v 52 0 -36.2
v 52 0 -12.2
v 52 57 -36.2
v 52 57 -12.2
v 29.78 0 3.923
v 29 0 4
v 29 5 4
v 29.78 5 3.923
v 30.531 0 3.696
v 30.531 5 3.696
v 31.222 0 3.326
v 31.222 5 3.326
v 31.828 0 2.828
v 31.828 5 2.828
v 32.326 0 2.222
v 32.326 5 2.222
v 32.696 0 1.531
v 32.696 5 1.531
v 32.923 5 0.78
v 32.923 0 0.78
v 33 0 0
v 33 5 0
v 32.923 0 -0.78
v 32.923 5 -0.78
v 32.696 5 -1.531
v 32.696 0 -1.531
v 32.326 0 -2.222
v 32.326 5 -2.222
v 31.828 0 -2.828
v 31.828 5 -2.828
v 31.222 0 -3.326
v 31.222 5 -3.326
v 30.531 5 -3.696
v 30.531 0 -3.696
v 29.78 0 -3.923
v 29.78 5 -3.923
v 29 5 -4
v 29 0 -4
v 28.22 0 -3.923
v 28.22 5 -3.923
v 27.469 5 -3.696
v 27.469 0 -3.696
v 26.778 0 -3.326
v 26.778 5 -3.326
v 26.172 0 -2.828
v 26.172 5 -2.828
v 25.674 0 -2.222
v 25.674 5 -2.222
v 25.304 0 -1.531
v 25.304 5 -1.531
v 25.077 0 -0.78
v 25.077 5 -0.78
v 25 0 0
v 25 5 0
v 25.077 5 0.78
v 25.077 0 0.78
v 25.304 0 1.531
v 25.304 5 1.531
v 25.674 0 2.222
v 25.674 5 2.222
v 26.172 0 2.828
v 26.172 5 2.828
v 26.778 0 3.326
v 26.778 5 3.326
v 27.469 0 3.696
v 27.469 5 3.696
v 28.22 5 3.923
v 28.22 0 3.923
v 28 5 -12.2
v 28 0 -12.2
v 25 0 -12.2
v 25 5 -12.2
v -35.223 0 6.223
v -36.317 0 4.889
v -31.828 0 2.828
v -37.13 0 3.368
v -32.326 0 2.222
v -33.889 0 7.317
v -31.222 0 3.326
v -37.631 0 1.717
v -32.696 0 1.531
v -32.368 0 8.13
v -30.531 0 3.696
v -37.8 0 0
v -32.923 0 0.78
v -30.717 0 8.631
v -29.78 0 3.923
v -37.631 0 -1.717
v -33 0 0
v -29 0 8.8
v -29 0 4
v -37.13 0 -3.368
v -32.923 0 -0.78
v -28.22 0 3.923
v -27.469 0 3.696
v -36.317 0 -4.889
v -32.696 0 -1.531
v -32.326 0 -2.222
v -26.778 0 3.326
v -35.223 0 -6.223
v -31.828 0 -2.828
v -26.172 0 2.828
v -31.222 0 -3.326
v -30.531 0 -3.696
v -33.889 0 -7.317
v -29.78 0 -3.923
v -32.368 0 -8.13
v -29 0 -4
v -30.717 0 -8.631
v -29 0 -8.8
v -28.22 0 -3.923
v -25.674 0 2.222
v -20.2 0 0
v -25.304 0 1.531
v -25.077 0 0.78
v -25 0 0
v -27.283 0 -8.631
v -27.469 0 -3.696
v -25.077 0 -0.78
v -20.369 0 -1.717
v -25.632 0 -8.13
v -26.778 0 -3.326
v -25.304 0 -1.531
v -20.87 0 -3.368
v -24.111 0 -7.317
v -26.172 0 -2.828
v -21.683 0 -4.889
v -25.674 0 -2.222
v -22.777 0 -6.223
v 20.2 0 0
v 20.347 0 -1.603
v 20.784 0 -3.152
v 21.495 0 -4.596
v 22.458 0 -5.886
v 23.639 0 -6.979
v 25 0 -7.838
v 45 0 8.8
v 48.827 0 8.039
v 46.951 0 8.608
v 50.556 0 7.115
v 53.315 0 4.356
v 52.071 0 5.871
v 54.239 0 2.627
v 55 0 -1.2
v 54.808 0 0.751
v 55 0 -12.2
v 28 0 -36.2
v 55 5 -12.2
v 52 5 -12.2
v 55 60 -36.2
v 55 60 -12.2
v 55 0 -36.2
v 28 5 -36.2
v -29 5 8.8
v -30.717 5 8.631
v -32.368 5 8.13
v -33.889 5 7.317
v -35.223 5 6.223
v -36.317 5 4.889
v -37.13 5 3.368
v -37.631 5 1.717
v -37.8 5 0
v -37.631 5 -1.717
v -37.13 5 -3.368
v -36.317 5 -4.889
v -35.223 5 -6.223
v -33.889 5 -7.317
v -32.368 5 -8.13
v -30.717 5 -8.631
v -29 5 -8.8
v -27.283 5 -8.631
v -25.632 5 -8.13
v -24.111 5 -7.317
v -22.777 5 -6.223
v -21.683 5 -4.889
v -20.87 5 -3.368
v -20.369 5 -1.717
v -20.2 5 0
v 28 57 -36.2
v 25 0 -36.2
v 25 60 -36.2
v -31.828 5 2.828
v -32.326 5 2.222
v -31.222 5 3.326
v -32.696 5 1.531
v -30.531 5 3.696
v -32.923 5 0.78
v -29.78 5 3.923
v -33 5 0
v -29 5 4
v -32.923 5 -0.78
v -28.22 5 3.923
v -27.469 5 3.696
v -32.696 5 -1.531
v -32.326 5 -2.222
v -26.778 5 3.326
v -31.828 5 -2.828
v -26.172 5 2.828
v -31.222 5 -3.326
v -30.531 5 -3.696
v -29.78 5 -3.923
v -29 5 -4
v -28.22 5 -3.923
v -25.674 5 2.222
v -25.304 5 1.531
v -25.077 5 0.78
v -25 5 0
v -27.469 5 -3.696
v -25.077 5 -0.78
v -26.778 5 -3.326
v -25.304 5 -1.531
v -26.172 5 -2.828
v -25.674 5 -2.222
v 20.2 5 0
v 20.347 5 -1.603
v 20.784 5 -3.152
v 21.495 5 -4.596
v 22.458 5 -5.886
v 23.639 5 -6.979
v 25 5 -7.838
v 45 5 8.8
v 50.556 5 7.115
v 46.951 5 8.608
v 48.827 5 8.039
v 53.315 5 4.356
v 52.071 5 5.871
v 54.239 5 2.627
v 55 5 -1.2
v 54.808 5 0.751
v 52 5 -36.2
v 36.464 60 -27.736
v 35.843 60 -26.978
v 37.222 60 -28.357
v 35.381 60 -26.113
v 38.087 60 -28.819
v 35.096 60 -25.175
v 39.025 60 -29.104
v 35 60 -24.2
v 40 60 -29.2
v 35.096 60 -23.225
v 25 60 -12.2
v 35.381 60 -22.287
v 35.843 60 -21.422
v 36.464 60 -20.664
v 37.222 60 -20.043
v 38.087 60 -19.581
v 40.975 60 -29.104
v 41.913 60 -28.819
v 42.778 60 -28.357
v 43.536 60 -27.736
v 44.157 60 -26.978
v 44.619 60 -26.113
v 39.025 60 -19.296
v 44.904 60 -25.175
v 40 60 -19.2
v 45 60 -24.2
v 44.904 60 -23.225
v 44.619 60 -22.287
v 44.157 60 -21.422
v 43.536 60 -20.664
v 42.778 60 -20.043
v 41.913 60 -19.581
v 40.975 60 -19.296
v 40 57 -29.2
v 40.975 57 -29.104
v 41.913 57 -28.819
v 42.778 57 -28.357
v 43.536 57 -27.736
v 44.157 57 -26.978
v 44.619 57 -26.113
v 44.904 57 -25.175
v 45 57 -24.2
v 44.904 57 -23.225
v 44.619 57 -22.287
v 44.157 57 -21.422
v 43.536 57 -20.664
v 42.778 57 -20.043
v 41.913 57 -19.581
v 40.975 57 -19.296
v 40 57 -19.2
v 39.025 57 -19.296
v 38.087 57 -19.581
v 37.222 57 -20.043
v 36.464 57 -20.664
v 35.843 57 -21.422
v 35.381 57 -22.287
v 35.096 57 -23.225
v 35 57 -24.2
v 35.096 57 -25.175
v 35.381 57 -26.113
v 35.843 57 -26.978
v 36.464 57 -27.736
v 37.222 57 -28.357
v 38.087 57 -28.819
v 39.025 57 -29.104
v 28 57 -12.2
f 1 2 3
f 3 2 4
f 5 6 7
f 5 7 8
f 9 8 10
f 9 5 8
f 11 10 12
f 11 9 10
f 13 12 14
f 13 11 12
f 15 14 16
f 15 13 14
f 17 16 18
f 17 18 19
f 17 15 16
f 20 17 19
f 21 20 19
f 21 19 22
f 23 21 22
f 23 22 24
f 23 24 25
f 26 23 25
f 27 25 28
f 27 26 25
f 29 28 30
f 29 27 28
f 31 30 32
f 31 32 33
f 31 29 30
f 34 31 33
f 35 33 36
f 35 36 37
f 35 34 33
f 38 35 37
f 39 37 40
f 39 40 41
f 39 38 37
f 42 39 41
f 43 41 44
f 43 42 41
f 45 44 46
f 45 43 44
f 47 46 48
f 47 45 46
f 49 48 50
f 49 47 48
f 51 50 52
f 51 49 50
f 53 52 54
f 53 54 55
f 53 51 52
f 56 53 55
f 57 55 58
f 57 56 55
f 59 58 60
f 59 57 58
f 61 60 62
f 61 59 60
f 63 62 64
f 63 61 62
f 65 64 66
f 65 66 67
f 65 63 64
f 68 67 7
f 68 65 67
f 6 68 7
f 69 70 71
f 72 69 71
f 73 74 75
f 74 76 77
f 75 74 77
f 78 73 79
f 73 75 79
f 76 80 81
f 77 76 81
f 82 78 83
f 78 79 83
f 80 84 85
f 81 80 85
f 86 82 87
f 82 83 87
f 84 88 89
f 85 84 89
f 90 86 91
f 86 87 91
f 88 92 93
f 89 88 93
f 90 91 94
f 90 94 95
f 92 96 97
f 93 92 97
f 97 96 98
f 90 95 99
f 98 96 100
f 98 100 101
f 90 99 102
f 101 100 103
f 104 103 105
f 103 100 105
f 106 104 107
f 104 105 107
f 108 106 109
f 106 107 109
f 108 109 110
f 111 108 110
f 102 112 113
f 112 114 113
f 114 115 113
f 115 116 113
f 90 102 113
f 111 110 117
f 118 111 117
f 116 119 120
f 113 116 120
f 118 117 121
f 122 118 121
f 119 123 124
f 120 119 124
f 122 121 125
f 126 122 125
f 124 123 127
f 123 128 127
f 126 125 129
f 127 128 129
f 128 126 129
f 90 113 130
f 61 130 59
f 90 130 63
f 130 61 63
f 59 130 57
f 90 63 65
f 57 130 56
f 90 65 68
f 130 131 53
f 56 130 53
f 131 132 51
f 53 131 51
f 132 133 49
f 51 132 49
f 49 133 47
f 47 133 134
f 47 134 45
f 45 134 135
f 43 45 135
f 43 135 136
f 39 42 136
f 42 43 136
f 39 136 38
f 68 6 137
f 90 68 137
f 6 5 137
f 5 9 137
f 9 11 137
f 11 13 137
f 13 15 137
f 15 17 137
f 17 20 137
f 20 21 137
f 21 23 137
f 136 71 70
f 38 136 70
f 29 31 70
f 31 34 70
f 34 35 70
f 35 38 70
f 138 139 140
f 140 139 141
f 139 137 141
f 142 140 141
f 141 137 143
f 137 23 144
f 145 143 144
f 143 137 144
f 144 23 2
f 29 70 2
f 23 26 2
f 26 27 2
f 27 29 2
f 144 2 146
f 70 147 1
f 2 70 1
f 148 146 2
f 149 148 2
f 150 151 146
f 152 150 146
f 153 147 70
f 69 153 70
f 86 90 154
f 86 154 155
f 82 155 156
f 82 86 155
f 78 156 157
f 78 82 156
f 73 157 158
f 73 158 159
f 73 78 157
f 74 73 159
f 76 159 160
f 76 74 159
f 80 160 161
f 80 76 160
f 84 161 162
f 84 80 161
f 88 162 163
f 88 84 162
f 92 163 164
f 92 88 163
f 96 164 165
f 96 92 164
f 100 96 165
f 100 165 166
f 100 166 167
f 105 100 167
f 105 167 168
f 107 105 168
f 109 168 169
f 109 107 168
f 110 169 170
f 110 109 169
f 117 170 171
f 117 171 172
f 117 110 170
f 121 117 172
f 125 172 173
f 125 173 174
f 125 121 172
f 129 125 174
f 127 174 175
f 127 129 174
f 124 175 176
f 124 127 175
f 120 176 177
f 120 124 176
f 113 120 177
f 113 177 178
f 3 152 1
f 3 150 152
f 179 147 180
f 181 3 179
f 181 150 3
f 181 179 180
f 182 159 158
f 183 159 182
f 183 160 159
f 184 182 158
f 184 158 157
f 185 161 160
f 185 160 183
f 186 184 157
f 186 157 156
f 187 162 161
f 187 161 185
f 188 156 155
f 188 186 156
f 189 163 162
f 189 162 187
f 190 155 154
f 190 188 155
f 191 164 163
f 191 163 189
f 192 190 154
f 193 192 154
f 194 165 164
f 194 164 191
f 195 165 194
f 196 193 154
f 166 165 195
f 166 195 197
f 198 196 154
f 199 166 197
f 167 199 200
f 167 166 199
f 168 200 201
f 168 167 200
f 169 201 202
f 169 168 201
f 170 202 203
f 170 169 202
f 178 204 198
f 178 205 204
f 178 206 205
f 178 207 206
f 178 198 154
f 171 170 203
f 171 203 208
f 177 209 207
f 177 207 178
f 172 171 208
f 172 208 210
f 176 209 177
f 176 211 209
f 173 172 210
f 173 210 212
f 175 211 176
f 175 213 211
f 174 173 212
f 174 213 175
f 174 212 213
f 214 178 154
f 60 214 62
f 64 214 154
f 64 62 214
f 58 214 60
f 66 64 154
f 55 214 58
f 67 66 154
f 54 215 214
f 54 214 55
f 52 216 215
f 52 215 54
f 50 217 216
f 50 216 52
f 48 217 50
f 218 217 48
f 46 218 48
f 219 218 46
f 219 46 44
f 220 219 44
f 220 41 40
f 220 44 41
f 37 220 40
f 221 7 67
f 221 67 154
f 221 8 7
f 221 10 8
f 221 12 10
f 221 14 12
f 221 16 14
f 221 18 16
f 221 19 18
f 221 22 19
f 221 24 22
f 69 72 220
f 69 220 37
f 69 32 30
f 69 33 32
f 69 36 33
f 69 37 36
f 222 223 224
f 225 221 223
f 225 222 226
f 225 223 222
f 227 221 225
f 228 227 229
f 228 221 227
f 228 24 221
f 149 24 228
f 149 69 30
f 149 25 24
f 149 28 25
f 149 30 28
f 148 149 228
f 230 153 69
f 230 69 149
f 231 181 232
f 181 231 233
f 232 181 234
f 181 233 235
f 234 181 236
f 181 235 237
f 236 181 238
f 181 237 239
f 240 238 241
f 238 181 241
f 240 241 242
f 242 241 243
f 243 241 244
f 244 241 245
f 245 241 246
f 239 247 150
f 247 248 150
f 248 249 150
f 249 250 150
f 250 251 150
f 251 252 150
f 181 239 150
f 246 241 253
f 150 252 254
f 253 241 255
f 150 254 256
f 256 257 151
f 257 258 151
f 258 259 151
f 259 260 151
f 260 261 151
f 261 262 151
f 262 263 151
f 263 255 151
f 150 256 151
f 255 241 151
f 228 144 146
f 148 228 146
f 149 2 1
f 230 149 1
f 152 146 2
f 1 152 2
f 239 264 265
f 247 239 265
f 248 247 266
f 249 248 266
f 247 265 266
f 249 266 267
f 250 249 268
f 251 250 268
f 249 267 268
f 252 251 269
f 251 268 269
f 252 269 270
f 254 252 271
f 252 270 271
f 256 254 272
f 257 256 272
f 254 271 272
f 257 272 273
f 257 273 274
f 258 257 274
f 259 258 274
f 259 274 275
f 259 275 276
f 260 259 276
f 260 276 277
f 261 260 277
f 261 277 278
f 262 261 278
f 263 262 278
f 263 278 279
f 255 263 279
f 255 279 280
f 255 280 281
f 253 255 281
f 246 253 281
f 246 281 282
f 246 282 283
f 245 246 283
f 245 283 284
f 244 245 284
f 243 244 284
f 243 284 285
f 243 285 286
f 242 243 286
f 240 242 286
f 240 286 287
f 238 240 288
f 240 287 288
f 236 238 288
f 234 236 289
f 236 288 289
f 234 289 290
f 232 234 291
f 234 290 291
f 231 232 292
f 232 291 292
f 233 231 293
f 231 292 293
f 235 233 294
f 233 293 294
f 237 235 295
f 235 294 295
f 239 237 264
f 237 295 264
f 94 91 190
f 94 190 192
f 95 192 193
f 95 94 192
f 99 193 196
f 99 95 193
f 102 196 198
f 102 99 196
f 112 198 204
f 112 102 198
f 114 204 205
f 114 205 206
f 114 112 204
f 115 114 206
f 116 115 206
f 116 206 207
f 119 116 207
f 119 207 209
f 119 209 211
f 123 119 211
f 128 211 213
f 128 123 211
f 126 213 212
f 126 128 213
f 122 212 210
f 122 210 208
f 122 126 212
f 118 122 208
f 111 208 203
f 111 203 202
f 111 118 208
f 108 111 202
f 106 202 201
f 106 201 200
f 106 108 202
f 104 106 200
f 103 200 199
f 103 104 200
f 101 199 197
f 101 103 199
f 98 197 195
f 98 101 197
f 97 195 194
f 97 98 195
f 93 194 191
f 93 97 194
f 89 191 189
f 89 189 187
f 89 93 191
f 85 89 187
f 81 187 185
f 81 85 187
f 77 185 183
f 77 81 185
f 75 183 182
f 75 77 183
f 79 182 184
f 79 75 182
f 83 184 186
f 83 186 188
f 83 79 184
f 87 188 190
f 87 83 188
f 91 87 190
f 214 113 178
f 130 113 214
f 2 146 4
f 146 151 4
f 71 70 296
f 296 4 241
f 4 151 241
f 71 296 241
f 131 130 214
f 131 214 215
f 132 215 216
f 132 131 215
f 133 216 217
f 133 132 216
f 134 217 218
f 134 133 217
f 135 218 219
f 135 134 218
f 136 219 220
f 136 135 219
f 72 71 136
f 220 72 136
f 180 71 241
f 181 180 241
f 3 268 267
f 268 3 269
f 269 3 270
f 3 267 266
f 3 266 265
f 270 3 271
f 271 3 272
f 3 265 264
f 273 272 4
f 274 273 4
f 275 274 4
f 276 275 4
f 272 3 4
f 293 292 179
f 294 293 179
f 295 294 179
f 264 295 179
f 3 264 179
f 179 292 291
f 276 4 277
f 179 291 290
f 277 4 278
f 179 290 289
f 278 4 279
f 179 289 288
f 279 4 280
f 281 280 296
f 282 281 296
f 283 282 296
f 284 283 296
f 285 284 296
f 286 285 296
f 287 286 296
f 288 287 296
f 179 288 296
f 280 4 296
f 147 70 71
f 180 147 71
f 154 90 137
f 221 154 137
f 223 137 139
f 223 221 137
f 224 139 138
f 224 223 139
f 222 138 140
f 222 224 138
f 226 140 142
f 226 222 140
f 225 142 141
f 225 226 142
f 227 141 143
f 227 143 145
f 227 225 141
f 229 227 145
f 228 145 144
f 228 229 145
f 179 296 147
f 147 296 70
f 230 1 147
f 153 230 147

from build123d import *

# Parameters (mm, degrees)
SKETCH_1_R          = 4
EXTRUDE_1_DEPTH     = 5
EXTRUDE_2_DEPTH     = 5
EXTRUDE_3_DEPTH     = 24
SKETCH_6_R          = 5
CUT_EXTRUDE_1_DEPTH = 5
FILLET_1_R          = 10


with BuildPart() as part:
    # ｽｹｯﾁ1 → ﾎﾞｽ - 押し出し1 (new body)
    with BuildSketch(Plane(origin=(0, 0, 0), x_dir=(1, 0, 0), z_dir=(0, 1, 0))):
        with BuildLine():
            Line((-20.2, 0), (20.2, 0))
            ThreePointArc((20.2, 0), (35.222539674, 6.222539674), (29, -8.8))
            Line((29, -8.8), (-29, -8.8))
            ThreePointArc((-29, -8.8), (-35.222539674, 6.222539674), (-20.2, 0))
        make_face()
        with Locations(Location((-29, 0, 0), (0, 0, 270))):
            Circle(SKETCH_1_R, mode=Mode.SUBTRACT)
        with Locations(Location((29, 0, 0), (0, 0, 270))):
            Circle(SKETCH_1_R, mode=Mode.SUBTRACT)
    extrude(amount=EXTRUDE_1_DEPTH)

    # ｽｹｯﾁ2 → ﾎﾞｽ - 押し出し2 (add)
    with BuildSketch(Plane(origin=(0, 0, 0), x_dir=(1, 0, 0), z_dir=(0, 1, 0))):
        with BuildLine():
            ThreePointArc((25, 7.838367177), (37.556215026, 2.056984303), (29, -8.8))
            Line((29, -8.8), (55, -8.8))
            Line((55, -8.8), (55, 12.2))
            Line((55, 12.2), (52, 12.2))
            Line((52, 12.2), (52, 36.2))
            Line((52, 36.2), (28, 36.2))
            Line((28, 36.2), (28, 12.2))
            Line((28, 12.2), (25, 12.2))
            Line((25, 12.2), (25, 7.838367177))
        make_face()
    extrude(amount=EXTRUDE_2_DEPTH)

    # ﾌｨﾚｯﾄ1
    fillet_1_edges = [part.edges().sort_by_distance(p)[0] for p in [
        (55, 2.5, 8.8),
    ]]
    fillet(fillet_1_edges, radius=FILLET_1_R)


with BuildPart() as body_2:
    # ｽｹｯﾁ5 → ﾎﾞｽ - 押し出し3 (new body)
    with BuildSketch(Plane(origin=(0, 0, -12.2), x_dir=(-1, 0, 0), z_dir=(0, 0, -1))):
        Polygon((-55, 0), (-52, 0), (-52, 57), (-28, 57), (-28, 0), (-25, 0), (-25, 60), (-55, 60), align=None)
    extrude(amount=EXTRUDE_3_DEPTH)

    # ｽｹｯﾁ6 → ｶｯﾄ - 押し出し1 (cut)
    with BuildSketch(Plane.XZ.offset(-57)):
        with Locations(Location((40, -24.2, 0), (0, 0, 270))):
            Circle(SKETCH_6_R)
    extrude(amount=-CUT_EXTRUDE_1_DEPTH, mode=Mode.SUBTRACT)


solid = Compound([part.part, body_2.part])
